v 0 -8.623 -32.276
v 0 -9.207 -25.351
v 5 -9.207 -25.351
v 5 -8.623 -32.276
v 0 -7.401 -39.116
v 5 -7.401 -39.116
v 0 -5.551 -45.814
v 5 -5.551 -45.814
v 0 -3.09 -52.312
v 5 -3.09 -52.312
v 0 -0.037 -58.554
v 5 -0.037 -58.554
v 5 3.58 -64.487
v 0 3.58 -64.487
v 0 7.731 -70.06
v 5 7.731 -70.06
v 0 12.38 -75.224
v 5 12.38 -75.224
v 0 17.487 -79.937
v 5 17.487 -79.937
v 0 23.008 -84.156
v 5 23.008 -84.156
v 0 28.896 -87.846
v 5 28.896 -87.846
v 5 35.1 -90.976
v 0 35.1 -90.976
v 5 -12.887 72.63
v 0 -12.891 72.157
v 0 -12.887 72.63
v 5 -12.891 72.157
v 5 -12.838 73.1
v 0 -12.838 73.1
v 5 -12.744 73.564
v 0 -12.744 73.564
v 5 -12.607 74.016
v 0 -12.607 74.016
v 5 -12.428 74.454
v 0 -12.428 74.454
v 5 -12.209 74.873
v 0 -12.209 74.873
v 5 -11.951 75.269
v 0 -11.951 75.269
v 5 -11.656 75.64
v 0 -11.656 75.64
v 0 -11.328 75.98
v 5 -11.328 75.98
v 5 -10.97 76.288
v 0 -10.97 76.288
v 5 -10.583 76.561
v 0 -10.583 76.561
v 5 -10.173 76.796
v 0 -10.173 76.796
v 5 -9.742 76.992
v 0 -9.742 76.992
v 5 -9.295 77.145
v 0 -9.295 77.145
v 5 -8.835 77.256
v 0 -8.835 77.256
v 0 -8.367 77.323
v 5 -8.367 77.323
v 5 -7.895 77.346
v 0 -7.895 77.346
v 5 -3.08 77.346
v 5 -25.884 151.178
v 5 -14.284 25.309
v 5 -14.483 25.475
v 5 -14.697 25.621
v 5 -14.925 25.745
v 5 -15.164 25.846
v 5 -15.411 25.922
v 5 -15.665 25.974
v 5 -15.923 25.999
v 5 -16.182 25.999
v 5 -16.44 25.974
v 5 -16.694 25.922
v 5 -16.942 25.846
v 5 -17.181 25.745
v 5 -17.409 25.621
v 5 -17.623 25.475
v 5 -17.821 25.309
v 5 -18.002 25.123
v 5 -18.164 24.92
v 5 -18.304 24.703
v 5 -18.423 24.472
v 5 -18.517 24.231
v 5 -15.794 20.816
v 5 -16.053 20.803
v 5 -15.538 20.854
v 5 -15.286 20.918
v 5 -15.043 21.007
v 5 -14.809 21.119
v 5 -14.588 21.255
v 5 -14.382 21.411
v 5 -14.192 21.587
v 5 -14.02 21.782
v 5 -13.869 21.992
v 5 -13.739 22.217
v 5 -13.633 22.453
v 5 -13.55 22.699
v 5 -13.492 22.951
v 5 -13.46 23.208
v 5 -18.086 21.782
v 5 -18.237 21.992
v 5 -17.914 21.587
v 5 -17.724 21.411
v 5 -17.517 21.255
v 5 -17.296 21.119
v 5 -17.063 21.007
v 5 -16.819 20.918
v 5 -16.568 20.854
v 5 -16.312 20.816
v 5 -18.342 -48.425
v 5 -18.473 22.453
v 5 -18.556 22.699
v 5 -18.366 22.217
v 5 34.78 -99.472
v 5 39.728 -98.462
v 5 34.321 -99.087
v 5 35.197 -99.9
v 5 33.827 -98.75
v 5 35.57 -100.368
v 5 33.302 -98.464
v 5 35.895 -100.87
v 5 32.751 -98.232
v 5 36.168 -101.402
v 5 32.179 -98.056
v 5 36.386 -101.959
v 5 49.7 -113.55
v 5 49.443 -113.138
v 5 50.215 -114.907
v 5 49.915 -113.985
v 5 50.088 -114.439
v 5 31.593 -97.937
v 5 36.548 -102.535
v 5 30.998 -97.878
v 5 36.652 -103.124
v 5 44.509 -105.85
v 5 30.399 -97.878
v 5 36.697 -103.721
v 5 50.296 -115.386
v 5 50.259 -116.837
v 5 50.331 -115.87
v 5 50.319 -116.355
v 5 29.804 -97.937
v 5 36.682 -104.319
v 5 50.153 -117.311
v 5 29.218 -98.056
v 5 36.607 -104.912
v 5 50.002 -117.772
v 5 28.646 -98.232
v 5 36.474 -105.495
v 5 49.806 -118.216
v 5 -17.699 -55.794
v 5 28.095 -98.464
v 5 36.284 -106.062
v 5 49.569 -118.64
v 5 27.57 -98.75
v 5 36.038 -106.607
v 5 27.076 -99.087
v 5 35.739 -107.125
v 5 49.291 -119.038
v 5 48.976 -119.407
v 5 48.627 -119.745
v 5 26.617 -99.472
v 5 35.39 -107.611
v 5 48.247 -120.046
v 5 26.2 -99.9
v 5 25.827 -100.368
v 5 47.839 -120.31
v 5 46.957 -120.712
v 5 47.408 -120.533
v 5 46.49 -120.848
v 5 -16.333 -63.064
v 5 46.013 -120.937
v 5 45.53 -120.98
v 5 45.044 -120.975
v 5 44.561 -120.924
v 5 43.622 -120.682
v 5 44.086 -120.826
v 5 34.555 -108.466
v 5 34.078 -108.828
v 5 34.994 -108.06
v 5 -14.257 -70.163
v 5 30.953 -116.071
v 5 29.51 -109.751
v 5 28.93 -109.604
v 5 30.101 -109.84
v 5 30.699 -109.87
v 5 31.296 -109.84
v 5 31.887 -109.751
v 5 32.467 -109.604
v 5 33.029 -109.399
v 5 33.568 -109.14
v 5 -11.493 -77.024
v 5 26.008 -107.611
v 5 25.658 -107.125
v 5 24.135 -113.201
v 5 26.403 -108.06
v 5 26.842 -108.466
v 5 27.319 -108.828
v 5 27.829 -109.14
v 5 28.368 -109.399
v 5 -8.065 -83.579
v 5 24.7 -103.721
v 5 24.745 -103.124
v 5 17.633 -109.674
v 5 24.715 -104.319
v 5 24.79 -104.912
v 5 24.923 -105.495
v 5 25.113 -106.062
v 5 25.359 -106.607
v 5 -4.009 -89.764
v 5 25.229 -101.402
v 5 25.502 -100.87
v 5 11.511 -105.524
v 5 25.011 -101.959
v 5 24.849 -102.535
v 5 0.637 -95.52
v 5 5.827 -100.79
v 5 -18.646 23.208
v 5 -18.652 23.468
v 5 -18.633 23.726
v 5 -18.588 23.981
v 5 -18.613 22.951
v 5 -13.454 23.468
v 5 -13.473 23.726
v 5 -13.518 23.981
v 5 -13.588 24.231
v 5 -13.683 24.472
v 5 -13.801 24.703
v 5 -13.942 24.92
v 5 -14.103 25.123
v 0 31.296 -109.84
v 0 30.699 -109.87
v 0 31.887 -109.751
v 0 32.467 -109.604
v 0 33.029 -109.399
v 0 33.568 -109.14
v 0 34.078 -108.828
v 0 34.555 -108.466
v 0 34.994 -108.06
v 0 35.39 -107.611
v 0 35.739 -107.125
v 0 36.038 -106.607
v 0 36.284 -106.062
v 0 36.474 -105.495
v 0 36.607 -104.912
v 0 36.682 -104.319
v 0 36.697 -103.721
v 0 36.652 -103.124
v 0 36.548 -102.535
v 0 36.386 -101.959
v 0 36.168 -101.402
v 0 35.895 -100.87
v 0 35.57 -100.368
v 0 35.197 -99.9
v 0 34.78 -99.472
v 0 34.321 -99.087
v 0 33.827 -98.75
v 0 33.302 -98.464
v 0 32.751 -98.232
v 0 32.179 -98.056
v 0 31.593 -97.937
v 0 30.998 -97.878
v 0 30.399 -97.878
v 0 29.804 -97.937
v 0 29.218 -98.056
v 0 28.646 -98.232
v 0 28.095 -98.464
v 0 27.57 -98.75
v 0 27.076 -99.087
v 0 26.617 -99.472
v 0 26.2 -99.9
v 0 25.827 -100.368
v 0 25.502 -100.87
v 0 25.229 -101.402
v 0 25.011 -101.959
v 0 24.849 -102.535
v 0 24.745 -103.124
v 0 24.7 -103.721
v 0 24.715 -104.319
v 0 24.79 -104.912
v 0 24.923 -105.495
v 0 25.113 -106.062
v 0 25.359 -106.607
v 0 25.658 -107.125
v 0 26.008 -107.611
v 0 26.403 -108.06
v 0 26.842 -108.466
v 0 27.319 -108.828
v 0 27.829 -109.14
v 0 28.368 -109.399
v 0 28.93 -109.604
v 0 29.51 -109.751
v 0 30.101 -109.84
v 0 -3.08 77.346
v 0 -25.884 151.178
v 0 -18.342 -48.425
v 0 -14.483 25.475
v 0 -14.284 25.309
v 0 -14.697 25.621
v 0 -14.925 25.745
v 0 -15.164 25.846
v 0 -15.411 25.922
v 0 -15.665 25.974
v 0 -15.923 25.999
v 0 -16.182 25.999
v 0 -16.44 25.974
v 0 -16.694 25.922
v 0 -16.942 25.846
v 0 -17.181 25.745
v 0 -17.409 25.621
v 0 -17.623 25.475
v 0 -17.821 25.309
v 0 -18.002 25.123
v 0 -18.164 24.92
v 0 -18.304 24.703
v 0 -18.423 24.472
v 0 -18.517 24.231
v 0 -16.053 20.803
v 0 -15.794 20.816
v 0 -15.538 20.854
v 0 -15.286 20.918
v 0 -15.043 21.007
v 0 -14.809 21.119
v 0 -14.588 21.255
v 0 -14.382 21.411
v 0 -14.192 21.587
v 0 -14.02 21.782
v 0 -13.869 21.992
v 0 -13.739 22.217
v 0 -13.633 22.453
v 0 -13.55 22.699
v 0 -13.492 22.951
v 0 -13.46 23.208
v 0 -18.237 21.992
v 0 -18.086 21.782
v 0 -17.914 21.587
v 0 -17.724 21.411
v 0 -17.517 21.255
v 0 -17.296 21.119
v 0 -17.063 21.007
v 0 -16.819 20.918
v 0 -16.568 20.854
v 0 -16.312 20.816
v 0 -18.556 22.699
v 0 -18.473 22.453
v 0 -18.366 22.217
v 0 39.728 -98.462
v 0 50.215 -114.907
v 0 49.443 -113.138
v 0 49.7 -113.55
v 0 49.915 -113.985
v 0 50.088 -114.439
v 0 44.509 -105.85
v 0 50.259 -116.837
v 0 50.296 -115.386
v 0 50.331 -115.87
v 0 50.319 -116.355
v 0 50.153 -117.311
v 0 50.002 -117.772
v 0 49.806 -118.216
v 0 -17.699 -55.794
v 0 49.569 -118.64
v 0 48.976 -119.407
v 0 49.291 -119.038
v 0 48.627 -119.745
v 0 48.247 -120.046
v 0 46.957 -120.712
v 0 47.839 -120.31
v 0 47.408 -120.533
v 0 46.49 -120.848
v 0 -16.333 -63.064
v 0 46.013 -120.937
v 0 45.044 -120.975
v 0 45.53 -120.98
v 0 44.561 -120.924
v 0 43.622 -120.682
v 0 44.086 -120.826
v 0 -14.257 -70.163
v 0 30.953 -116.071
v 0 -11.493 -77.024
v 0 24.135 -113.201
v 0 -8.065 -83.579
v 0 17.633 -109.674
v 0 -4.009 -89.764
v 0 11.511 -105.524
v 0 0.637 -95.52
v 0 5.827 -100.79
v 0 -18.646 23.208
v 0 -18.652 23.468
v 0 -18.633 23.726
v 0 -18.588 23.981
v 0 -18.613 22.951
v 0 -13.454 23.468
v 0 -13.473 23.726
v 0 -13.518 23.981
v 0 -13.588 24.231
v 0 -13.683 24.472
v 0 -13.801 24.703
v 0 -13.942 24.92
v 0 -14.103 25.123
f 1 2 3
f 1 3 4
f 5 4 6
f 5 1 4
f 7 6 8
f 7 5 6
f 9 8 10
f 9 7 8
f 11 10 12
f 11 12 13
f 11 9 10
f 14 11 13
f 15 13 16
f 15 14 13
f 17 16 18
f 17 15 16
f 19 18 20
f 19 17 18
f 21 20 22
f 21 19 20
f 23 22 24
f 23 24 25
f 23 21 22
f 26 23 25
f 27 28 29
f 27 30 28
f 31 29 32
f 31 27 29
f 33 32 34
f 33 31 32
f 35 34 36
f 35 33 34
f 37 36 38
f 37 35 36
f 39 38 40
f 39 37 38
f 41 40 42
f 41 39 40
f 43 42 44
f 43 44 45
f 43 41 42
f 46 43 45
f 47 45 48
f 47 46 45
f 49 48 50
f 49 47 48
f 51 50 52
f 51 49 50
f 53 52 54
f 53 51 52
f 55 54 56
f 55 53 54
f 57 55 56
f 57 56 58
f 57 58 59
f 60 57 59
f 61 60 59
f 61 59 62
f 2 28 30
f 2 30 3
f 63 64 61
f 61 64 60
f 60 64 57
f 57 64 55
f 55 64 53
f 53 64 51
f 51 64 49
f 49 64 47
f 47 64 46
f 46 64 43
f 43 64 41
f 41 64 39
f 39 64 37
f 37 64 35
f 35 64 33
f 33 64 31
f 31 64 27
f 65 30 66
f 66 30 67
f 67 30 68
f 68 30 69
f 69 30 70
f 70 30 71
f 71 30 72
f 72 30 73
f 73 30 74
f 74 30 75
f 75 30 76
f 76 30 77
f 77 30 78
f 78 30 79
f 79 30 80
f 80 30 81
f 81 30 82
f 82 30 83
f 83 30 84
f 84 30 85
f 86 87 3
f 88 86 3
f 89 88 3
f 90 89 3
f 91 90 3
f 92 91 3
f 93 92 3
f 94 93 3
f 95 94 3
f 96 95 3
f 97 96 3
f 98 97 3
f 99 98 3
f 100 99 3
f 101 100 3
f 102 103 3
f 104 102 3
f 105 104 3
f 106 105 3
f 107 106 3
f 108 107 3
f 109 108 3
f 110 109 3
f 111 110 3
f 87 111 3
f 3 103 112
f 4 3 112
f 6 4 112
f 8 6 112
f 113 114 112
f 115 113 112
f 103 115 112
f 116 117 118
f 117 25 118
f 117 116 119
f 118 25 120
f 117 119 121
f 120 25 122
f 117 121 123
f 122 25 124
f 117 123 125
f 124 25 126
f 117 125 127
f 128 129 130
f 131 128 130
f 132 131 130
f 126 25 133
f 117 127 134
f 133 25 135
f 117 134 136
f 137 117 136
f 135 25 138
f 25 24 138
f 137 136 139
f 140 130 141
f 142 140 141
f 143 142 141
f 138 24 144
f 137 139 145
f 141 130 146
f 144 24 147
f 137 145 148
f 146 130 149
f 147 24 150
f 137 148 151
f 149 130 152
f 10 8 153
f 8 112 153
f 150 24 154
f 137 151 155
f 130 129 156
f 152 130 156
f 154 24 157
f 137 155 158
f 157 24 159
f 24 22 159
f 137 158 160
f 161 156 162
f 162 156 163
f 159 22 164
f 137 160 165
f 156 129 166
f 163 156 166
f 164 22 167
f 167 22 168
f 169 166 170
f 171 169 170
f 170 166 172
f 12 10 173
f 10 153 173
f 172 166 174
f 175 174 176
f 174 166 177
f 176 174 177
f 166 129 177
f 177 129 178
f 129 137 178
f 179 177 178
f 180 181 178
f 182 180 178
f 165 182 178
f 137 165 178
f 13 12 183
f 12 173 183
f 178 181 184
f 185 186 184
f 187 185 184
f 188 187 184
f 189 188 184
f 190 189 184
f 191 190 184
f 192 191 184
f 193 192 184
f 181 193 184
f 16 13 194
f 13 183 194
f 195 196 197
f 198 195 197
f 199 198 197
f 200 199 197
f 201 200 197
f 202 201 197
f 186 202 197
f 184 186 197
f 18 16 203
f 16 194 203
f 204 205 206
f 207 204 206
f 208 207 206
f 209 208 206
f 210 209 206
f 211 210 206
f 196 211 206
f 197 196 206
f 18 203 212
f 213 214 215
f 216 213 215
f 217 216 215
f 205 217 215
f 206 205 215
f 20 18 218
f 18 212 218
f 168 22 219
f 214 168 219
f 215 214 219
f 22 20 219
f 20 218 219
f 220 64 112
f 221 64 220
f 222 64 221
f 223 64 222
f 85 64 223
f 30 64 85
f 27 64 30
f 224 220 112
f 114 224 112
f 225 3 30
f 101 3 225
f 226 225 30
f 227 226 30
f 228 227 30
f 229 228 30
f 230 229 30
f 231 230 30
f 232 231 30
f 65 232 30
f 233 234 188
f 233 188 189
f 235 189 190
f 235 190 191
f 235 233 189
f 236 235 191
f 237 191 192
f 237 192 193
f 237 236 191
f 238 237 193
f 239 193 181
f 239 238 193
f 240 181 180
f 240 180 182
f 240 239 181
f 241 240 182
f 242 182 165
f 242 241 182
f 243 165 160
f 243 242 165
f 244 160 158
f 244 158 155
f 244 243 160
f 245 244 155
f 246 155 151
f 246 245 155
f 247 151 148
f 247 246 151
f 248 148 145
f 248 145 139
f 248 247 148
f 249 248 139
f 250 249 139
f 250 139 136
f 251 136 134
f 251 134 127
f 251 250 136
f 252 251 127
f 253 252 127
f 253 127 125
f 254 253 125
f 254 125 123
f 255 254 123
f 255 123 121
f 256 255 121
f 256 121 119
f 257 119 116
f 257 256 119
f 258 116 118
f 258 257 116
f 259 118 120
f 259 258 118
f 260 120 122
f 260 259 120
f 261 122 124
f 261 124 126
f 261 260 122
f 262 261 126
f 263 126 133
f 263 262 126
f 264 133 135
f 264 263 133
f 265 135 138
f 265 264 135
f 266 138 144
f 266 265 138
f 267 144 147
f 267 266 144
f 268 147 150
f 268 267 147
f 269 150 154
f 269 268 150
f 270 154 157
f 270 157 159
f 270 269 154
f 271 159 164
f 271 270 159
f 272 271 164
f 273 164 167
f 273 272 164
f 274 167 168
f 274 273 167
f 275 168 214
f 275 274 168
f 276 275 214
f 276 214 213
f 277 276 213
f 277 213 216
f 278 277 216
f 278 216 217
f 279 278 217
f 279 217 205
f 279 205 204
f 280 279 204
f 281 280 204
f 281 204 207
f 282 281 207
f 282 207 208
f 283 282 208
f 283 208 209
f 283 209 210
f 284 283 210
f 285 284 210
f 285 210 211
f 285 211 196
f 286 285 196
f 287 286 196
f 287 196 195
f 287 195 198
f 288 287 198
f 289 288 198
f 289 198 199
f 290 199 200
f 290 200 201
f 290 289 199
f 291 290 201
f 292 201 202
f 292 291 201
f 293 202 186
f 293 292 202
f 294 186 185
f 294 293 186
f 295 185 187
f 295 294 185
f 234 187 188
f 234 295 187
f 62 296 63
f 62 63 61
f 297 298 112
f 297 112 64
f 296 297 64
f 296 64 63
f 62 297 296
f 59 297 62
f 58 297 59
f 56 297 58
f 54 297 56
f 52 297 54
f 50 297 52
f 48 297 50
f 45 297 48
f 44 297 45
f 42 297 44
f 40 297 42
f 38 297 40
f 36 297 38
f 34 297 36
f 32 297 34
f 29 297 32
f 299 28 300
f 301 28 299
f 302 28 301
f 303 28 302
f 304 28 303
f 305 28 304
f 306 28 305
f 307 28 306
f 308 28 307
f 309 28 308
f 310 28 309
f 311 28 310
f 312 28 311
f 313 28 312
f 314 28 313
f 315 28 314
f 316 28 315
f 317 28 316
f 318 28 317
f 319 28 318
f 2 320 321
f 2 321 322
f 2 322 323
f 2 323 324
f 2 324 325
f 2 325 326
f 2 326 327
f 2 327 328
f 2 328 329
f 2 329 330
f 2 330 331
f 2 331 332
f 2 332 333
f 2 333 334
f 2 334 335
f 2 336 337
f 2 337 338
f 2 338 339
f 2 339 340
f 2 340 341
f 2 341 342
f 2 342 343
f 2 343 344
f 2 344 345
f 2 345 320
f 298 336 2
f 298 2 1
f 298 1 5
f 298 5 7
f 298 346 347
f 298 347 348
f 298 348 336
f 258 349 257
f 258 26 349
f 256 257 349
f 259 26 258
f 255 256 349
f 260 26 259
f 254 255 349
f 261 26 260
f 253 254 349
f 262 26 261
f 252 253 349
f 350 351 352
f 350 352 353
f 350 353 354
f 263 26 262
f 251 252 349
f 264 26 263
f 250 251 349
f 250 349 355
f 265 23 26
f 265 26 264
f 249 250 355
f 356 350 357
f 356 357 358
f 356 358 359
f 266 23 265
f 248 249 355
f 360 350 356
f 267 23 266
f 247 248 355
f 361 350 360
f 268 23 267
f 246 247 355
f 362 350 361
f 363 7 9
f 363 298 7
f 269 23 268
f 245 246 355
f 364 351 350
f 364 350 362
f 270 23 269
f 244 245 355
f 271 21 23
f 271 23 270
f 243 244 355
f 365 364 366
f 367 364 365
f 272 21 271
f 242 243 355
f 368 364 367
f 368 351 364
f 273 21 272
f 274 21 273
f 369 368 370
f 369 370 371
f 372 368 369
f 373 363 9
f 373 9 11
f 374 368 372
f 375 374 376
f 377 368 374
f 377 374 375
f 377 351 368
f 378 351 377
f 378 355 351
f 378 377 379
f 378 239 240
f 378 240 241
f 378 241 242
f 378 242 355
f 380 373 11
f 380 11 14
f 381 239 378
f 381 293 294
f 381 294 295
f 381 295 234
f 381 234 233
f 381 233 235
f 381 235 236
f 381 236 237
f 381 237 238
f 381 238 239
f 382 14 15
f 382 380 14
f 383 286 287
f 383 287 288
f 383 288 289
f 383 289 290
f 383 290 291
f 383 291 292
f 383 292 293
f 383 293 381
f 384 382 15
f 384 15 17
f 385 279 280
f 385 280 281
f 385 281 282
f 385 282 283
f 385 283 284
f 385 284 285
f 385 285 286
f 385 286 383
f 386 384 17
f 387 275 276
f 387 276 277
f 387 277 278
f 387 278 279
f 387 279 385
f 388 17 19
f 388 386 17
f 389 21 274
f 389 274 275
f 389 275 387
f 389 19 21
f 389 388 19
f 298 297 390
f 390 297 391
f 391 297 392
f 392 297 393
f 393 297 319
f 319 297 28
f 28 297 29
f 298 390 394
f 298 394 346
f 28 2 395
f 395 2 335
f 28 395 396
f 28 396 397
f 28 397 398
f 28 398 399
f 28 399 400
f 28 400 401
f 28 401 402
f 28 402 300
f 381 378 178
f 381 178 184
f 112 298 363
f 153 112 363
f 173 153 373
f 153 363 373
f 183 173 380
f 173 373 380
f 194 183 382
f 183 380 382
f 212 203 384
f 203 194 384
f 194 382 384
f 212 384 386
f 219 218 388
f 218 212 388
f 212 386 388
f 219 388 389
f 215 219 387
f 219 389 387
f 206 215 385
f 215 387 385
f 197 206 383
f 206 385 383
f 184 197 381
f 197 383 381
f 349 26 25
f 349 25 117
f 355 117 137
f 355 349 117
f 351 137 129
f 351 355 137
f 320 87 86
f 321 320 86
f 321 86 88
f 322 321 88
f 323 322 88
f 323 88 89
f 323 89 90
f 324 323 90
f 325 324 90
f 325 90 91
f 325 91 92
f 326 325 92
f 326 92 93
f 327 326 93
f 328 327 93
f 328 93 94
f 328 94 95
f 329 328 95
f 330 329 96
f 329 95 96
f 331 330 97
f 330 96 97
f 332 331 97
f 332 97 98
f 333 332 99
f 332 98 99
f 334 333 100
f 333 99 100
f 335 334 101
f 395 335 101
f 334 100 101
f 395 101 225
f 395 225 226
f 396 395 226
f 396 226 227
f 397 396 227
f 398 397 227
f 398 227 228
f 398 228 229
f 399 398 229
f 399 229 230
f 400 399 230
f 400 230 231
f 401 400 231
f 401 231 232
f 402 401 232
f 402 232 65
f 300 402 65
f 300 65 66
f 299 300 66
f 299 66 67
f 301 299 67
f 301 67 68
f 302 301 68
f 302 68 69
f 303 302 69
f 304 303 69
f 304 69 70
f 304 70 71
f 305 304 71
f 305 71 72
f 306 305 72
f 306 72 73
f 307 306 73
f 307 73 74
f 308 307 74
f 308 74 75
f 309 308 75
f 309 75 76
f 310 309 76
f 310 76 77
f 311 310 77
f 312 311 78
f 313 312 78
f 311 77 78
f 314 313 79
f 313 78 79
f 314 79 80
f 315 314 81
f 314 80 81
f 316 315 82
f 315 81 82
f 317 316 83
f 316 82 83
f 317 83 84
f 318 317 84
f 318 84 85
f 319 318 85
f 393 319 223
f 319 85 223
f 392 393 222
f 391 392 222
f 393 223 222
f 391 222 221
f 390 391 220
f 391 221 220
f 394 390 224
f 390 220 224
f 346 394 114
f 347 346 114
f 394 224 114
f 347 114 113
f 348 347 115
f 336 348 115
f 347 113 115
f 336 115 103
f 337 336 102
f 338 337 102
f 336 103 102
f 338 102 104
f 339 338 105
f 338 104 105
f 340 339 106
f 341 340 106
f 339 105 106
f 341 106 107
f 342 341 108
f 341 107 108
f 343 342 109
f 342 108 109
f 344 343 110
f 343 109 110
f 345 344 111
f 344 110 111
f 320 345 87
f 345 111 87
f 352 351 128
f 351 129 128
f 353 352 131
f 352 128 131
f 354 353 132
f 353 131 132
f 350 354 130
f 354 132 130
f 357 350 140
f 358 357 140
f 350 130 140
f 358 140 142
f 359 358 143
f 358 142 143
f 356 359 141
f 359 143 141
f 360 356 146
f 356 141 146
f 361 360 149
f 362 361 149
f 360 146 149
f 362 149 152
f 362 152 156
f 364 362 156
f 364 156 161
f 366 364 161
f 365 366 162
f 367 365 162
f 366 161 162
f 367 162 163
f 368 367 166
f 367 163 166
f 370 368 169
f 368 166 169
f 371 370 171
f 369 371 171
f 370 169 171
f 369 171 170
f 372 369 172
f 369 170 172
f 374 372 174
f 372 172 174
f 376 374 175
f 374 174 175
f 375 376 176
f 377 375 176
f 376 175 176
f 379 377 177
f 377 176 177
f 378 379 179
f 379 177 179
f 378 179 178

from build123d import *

# Parameters (mm, degrees)
SKETCH_1_R          = 6
EXTRUDE_1_DEPTH     = 5
FILLET_1_R          = 5
FILLET_2_R          = 75
FILLET_3_R          = 5
SKETCH_3_R          = 2.6
CUT_EXTRUDE_1_DEPTH = 160.415234704


with BuildPart() as part:
    # Эскиз1 → Бобышка-Вытянуть1 (new body)
    with BuildSketch(Plane(origin=(0, 0, 0), x_dir=(0, 0, -1), z_dir=(1, 0, 0))):
        with BuildLine():
            Line((126.237664014, 58.886284382), (98.821729218, -16.438377404))
            Line((98.821729218, -16.438377404), (-151.178270782, -25.884067346))
            Line((-151.178270782, -25.884067346), (-77.345590471, -3.080194644))
            Line((-77.345590471, -3.080194644), (-77.345590471, -13.087329783))
            Line((-77.345590471, -13.087329783), (75.539410437, -7.310912522))
            Line((75.539410437, -7.310912522), (90.975731778, 35.100031802))
            ThreePointArc((90.975731778, 35.100031802), (108.905022115, 46.550907327), (126.237664014, 58.886284382))
        make_face()
        with Locations((103.870185422, 30.698515365)):
            Circle(SKETCH_1_R, mode=Mode.SUBTRACT)
    extrude(amount=EXTRUDE_1_DEPTH)

    # Скругление1
    fillet_1_edges = [part.edges().sort_by_distance(p)[0] for p in [
        (2.5, -13.087329783, 77.345590471),
    ]]
    fillet(fillet_1_edges, radius=FILLET_1_R)

    # Скругление2
    # the kernel refuses this fillet: 75 mm, written as the material it adds along each edge
    with BuildSketch(Plane(origin=(0, -7.310912522, -75.539410437), x_dir=(0, -0.037755820465347284, 0.9992869948223027), z_dir=(1, 0, 0))) as fillet_2_piece_1:
        with BuildLine():
            CenterArc((50.223853574, -75), FILLET_2_R, 90, 63.724056715)
            Line((-17.026575163, -41.797894123), (0, 0))
            Line((0, 0), (50.223853574, 0))
        make_face()
    extrude(amount=5)
    # the kernel refuses this fillet: 75 mm, written as the material it takes off along each edge
    with BuildSketch(Plane(origin=(-126.080854452, -16.438377404, -98.821729218), x_dir=(0, -0.03775582046534733, 0.9992869948223025), z_dir=(1, 0, 0))) as fillet_2_2_piece_1:
        with BuildLine():
            CenterArc((FILLET_2_R * 0.672431223743, -FILLET_2_R), FILLET_2_R, 90, 67.836236553)
            Line((-FILLET_2_R * 0.253678140212, -FILLET_2_R * 0.622744852924), (0, 0))
            Line((0, 0), (FILLET_2_R * 0.672431223743, 0))
        make_face()
    extrude(amount=257.161708904, mode=Mode.SUBTRACT)

    # Скругление3
    fillet_3_edges = [part.edges().sort_by_distance(p)[0] for p in [
        (2.5, 58.886284382, -126.237664014),
    ]]
    fillet(fillet_3_edges, radius=FILLET_3_R)

    # Эскиз3 → Вырез-Вытянуть1 (cut, through all)
    with BuildSketch(Plane(origin=(5, 0, 0), x_dir=(0, 0, -1), z_dir=(1, 0, 0))):
        with Locations((-23.402722319, -16.052786924)):
            Circle(SKETCH_3_R)
    extrude(amount=-CUT_EXTRUDE_1_DEPTH, mode=Mode.SUBTRACT)


solid = part.part
